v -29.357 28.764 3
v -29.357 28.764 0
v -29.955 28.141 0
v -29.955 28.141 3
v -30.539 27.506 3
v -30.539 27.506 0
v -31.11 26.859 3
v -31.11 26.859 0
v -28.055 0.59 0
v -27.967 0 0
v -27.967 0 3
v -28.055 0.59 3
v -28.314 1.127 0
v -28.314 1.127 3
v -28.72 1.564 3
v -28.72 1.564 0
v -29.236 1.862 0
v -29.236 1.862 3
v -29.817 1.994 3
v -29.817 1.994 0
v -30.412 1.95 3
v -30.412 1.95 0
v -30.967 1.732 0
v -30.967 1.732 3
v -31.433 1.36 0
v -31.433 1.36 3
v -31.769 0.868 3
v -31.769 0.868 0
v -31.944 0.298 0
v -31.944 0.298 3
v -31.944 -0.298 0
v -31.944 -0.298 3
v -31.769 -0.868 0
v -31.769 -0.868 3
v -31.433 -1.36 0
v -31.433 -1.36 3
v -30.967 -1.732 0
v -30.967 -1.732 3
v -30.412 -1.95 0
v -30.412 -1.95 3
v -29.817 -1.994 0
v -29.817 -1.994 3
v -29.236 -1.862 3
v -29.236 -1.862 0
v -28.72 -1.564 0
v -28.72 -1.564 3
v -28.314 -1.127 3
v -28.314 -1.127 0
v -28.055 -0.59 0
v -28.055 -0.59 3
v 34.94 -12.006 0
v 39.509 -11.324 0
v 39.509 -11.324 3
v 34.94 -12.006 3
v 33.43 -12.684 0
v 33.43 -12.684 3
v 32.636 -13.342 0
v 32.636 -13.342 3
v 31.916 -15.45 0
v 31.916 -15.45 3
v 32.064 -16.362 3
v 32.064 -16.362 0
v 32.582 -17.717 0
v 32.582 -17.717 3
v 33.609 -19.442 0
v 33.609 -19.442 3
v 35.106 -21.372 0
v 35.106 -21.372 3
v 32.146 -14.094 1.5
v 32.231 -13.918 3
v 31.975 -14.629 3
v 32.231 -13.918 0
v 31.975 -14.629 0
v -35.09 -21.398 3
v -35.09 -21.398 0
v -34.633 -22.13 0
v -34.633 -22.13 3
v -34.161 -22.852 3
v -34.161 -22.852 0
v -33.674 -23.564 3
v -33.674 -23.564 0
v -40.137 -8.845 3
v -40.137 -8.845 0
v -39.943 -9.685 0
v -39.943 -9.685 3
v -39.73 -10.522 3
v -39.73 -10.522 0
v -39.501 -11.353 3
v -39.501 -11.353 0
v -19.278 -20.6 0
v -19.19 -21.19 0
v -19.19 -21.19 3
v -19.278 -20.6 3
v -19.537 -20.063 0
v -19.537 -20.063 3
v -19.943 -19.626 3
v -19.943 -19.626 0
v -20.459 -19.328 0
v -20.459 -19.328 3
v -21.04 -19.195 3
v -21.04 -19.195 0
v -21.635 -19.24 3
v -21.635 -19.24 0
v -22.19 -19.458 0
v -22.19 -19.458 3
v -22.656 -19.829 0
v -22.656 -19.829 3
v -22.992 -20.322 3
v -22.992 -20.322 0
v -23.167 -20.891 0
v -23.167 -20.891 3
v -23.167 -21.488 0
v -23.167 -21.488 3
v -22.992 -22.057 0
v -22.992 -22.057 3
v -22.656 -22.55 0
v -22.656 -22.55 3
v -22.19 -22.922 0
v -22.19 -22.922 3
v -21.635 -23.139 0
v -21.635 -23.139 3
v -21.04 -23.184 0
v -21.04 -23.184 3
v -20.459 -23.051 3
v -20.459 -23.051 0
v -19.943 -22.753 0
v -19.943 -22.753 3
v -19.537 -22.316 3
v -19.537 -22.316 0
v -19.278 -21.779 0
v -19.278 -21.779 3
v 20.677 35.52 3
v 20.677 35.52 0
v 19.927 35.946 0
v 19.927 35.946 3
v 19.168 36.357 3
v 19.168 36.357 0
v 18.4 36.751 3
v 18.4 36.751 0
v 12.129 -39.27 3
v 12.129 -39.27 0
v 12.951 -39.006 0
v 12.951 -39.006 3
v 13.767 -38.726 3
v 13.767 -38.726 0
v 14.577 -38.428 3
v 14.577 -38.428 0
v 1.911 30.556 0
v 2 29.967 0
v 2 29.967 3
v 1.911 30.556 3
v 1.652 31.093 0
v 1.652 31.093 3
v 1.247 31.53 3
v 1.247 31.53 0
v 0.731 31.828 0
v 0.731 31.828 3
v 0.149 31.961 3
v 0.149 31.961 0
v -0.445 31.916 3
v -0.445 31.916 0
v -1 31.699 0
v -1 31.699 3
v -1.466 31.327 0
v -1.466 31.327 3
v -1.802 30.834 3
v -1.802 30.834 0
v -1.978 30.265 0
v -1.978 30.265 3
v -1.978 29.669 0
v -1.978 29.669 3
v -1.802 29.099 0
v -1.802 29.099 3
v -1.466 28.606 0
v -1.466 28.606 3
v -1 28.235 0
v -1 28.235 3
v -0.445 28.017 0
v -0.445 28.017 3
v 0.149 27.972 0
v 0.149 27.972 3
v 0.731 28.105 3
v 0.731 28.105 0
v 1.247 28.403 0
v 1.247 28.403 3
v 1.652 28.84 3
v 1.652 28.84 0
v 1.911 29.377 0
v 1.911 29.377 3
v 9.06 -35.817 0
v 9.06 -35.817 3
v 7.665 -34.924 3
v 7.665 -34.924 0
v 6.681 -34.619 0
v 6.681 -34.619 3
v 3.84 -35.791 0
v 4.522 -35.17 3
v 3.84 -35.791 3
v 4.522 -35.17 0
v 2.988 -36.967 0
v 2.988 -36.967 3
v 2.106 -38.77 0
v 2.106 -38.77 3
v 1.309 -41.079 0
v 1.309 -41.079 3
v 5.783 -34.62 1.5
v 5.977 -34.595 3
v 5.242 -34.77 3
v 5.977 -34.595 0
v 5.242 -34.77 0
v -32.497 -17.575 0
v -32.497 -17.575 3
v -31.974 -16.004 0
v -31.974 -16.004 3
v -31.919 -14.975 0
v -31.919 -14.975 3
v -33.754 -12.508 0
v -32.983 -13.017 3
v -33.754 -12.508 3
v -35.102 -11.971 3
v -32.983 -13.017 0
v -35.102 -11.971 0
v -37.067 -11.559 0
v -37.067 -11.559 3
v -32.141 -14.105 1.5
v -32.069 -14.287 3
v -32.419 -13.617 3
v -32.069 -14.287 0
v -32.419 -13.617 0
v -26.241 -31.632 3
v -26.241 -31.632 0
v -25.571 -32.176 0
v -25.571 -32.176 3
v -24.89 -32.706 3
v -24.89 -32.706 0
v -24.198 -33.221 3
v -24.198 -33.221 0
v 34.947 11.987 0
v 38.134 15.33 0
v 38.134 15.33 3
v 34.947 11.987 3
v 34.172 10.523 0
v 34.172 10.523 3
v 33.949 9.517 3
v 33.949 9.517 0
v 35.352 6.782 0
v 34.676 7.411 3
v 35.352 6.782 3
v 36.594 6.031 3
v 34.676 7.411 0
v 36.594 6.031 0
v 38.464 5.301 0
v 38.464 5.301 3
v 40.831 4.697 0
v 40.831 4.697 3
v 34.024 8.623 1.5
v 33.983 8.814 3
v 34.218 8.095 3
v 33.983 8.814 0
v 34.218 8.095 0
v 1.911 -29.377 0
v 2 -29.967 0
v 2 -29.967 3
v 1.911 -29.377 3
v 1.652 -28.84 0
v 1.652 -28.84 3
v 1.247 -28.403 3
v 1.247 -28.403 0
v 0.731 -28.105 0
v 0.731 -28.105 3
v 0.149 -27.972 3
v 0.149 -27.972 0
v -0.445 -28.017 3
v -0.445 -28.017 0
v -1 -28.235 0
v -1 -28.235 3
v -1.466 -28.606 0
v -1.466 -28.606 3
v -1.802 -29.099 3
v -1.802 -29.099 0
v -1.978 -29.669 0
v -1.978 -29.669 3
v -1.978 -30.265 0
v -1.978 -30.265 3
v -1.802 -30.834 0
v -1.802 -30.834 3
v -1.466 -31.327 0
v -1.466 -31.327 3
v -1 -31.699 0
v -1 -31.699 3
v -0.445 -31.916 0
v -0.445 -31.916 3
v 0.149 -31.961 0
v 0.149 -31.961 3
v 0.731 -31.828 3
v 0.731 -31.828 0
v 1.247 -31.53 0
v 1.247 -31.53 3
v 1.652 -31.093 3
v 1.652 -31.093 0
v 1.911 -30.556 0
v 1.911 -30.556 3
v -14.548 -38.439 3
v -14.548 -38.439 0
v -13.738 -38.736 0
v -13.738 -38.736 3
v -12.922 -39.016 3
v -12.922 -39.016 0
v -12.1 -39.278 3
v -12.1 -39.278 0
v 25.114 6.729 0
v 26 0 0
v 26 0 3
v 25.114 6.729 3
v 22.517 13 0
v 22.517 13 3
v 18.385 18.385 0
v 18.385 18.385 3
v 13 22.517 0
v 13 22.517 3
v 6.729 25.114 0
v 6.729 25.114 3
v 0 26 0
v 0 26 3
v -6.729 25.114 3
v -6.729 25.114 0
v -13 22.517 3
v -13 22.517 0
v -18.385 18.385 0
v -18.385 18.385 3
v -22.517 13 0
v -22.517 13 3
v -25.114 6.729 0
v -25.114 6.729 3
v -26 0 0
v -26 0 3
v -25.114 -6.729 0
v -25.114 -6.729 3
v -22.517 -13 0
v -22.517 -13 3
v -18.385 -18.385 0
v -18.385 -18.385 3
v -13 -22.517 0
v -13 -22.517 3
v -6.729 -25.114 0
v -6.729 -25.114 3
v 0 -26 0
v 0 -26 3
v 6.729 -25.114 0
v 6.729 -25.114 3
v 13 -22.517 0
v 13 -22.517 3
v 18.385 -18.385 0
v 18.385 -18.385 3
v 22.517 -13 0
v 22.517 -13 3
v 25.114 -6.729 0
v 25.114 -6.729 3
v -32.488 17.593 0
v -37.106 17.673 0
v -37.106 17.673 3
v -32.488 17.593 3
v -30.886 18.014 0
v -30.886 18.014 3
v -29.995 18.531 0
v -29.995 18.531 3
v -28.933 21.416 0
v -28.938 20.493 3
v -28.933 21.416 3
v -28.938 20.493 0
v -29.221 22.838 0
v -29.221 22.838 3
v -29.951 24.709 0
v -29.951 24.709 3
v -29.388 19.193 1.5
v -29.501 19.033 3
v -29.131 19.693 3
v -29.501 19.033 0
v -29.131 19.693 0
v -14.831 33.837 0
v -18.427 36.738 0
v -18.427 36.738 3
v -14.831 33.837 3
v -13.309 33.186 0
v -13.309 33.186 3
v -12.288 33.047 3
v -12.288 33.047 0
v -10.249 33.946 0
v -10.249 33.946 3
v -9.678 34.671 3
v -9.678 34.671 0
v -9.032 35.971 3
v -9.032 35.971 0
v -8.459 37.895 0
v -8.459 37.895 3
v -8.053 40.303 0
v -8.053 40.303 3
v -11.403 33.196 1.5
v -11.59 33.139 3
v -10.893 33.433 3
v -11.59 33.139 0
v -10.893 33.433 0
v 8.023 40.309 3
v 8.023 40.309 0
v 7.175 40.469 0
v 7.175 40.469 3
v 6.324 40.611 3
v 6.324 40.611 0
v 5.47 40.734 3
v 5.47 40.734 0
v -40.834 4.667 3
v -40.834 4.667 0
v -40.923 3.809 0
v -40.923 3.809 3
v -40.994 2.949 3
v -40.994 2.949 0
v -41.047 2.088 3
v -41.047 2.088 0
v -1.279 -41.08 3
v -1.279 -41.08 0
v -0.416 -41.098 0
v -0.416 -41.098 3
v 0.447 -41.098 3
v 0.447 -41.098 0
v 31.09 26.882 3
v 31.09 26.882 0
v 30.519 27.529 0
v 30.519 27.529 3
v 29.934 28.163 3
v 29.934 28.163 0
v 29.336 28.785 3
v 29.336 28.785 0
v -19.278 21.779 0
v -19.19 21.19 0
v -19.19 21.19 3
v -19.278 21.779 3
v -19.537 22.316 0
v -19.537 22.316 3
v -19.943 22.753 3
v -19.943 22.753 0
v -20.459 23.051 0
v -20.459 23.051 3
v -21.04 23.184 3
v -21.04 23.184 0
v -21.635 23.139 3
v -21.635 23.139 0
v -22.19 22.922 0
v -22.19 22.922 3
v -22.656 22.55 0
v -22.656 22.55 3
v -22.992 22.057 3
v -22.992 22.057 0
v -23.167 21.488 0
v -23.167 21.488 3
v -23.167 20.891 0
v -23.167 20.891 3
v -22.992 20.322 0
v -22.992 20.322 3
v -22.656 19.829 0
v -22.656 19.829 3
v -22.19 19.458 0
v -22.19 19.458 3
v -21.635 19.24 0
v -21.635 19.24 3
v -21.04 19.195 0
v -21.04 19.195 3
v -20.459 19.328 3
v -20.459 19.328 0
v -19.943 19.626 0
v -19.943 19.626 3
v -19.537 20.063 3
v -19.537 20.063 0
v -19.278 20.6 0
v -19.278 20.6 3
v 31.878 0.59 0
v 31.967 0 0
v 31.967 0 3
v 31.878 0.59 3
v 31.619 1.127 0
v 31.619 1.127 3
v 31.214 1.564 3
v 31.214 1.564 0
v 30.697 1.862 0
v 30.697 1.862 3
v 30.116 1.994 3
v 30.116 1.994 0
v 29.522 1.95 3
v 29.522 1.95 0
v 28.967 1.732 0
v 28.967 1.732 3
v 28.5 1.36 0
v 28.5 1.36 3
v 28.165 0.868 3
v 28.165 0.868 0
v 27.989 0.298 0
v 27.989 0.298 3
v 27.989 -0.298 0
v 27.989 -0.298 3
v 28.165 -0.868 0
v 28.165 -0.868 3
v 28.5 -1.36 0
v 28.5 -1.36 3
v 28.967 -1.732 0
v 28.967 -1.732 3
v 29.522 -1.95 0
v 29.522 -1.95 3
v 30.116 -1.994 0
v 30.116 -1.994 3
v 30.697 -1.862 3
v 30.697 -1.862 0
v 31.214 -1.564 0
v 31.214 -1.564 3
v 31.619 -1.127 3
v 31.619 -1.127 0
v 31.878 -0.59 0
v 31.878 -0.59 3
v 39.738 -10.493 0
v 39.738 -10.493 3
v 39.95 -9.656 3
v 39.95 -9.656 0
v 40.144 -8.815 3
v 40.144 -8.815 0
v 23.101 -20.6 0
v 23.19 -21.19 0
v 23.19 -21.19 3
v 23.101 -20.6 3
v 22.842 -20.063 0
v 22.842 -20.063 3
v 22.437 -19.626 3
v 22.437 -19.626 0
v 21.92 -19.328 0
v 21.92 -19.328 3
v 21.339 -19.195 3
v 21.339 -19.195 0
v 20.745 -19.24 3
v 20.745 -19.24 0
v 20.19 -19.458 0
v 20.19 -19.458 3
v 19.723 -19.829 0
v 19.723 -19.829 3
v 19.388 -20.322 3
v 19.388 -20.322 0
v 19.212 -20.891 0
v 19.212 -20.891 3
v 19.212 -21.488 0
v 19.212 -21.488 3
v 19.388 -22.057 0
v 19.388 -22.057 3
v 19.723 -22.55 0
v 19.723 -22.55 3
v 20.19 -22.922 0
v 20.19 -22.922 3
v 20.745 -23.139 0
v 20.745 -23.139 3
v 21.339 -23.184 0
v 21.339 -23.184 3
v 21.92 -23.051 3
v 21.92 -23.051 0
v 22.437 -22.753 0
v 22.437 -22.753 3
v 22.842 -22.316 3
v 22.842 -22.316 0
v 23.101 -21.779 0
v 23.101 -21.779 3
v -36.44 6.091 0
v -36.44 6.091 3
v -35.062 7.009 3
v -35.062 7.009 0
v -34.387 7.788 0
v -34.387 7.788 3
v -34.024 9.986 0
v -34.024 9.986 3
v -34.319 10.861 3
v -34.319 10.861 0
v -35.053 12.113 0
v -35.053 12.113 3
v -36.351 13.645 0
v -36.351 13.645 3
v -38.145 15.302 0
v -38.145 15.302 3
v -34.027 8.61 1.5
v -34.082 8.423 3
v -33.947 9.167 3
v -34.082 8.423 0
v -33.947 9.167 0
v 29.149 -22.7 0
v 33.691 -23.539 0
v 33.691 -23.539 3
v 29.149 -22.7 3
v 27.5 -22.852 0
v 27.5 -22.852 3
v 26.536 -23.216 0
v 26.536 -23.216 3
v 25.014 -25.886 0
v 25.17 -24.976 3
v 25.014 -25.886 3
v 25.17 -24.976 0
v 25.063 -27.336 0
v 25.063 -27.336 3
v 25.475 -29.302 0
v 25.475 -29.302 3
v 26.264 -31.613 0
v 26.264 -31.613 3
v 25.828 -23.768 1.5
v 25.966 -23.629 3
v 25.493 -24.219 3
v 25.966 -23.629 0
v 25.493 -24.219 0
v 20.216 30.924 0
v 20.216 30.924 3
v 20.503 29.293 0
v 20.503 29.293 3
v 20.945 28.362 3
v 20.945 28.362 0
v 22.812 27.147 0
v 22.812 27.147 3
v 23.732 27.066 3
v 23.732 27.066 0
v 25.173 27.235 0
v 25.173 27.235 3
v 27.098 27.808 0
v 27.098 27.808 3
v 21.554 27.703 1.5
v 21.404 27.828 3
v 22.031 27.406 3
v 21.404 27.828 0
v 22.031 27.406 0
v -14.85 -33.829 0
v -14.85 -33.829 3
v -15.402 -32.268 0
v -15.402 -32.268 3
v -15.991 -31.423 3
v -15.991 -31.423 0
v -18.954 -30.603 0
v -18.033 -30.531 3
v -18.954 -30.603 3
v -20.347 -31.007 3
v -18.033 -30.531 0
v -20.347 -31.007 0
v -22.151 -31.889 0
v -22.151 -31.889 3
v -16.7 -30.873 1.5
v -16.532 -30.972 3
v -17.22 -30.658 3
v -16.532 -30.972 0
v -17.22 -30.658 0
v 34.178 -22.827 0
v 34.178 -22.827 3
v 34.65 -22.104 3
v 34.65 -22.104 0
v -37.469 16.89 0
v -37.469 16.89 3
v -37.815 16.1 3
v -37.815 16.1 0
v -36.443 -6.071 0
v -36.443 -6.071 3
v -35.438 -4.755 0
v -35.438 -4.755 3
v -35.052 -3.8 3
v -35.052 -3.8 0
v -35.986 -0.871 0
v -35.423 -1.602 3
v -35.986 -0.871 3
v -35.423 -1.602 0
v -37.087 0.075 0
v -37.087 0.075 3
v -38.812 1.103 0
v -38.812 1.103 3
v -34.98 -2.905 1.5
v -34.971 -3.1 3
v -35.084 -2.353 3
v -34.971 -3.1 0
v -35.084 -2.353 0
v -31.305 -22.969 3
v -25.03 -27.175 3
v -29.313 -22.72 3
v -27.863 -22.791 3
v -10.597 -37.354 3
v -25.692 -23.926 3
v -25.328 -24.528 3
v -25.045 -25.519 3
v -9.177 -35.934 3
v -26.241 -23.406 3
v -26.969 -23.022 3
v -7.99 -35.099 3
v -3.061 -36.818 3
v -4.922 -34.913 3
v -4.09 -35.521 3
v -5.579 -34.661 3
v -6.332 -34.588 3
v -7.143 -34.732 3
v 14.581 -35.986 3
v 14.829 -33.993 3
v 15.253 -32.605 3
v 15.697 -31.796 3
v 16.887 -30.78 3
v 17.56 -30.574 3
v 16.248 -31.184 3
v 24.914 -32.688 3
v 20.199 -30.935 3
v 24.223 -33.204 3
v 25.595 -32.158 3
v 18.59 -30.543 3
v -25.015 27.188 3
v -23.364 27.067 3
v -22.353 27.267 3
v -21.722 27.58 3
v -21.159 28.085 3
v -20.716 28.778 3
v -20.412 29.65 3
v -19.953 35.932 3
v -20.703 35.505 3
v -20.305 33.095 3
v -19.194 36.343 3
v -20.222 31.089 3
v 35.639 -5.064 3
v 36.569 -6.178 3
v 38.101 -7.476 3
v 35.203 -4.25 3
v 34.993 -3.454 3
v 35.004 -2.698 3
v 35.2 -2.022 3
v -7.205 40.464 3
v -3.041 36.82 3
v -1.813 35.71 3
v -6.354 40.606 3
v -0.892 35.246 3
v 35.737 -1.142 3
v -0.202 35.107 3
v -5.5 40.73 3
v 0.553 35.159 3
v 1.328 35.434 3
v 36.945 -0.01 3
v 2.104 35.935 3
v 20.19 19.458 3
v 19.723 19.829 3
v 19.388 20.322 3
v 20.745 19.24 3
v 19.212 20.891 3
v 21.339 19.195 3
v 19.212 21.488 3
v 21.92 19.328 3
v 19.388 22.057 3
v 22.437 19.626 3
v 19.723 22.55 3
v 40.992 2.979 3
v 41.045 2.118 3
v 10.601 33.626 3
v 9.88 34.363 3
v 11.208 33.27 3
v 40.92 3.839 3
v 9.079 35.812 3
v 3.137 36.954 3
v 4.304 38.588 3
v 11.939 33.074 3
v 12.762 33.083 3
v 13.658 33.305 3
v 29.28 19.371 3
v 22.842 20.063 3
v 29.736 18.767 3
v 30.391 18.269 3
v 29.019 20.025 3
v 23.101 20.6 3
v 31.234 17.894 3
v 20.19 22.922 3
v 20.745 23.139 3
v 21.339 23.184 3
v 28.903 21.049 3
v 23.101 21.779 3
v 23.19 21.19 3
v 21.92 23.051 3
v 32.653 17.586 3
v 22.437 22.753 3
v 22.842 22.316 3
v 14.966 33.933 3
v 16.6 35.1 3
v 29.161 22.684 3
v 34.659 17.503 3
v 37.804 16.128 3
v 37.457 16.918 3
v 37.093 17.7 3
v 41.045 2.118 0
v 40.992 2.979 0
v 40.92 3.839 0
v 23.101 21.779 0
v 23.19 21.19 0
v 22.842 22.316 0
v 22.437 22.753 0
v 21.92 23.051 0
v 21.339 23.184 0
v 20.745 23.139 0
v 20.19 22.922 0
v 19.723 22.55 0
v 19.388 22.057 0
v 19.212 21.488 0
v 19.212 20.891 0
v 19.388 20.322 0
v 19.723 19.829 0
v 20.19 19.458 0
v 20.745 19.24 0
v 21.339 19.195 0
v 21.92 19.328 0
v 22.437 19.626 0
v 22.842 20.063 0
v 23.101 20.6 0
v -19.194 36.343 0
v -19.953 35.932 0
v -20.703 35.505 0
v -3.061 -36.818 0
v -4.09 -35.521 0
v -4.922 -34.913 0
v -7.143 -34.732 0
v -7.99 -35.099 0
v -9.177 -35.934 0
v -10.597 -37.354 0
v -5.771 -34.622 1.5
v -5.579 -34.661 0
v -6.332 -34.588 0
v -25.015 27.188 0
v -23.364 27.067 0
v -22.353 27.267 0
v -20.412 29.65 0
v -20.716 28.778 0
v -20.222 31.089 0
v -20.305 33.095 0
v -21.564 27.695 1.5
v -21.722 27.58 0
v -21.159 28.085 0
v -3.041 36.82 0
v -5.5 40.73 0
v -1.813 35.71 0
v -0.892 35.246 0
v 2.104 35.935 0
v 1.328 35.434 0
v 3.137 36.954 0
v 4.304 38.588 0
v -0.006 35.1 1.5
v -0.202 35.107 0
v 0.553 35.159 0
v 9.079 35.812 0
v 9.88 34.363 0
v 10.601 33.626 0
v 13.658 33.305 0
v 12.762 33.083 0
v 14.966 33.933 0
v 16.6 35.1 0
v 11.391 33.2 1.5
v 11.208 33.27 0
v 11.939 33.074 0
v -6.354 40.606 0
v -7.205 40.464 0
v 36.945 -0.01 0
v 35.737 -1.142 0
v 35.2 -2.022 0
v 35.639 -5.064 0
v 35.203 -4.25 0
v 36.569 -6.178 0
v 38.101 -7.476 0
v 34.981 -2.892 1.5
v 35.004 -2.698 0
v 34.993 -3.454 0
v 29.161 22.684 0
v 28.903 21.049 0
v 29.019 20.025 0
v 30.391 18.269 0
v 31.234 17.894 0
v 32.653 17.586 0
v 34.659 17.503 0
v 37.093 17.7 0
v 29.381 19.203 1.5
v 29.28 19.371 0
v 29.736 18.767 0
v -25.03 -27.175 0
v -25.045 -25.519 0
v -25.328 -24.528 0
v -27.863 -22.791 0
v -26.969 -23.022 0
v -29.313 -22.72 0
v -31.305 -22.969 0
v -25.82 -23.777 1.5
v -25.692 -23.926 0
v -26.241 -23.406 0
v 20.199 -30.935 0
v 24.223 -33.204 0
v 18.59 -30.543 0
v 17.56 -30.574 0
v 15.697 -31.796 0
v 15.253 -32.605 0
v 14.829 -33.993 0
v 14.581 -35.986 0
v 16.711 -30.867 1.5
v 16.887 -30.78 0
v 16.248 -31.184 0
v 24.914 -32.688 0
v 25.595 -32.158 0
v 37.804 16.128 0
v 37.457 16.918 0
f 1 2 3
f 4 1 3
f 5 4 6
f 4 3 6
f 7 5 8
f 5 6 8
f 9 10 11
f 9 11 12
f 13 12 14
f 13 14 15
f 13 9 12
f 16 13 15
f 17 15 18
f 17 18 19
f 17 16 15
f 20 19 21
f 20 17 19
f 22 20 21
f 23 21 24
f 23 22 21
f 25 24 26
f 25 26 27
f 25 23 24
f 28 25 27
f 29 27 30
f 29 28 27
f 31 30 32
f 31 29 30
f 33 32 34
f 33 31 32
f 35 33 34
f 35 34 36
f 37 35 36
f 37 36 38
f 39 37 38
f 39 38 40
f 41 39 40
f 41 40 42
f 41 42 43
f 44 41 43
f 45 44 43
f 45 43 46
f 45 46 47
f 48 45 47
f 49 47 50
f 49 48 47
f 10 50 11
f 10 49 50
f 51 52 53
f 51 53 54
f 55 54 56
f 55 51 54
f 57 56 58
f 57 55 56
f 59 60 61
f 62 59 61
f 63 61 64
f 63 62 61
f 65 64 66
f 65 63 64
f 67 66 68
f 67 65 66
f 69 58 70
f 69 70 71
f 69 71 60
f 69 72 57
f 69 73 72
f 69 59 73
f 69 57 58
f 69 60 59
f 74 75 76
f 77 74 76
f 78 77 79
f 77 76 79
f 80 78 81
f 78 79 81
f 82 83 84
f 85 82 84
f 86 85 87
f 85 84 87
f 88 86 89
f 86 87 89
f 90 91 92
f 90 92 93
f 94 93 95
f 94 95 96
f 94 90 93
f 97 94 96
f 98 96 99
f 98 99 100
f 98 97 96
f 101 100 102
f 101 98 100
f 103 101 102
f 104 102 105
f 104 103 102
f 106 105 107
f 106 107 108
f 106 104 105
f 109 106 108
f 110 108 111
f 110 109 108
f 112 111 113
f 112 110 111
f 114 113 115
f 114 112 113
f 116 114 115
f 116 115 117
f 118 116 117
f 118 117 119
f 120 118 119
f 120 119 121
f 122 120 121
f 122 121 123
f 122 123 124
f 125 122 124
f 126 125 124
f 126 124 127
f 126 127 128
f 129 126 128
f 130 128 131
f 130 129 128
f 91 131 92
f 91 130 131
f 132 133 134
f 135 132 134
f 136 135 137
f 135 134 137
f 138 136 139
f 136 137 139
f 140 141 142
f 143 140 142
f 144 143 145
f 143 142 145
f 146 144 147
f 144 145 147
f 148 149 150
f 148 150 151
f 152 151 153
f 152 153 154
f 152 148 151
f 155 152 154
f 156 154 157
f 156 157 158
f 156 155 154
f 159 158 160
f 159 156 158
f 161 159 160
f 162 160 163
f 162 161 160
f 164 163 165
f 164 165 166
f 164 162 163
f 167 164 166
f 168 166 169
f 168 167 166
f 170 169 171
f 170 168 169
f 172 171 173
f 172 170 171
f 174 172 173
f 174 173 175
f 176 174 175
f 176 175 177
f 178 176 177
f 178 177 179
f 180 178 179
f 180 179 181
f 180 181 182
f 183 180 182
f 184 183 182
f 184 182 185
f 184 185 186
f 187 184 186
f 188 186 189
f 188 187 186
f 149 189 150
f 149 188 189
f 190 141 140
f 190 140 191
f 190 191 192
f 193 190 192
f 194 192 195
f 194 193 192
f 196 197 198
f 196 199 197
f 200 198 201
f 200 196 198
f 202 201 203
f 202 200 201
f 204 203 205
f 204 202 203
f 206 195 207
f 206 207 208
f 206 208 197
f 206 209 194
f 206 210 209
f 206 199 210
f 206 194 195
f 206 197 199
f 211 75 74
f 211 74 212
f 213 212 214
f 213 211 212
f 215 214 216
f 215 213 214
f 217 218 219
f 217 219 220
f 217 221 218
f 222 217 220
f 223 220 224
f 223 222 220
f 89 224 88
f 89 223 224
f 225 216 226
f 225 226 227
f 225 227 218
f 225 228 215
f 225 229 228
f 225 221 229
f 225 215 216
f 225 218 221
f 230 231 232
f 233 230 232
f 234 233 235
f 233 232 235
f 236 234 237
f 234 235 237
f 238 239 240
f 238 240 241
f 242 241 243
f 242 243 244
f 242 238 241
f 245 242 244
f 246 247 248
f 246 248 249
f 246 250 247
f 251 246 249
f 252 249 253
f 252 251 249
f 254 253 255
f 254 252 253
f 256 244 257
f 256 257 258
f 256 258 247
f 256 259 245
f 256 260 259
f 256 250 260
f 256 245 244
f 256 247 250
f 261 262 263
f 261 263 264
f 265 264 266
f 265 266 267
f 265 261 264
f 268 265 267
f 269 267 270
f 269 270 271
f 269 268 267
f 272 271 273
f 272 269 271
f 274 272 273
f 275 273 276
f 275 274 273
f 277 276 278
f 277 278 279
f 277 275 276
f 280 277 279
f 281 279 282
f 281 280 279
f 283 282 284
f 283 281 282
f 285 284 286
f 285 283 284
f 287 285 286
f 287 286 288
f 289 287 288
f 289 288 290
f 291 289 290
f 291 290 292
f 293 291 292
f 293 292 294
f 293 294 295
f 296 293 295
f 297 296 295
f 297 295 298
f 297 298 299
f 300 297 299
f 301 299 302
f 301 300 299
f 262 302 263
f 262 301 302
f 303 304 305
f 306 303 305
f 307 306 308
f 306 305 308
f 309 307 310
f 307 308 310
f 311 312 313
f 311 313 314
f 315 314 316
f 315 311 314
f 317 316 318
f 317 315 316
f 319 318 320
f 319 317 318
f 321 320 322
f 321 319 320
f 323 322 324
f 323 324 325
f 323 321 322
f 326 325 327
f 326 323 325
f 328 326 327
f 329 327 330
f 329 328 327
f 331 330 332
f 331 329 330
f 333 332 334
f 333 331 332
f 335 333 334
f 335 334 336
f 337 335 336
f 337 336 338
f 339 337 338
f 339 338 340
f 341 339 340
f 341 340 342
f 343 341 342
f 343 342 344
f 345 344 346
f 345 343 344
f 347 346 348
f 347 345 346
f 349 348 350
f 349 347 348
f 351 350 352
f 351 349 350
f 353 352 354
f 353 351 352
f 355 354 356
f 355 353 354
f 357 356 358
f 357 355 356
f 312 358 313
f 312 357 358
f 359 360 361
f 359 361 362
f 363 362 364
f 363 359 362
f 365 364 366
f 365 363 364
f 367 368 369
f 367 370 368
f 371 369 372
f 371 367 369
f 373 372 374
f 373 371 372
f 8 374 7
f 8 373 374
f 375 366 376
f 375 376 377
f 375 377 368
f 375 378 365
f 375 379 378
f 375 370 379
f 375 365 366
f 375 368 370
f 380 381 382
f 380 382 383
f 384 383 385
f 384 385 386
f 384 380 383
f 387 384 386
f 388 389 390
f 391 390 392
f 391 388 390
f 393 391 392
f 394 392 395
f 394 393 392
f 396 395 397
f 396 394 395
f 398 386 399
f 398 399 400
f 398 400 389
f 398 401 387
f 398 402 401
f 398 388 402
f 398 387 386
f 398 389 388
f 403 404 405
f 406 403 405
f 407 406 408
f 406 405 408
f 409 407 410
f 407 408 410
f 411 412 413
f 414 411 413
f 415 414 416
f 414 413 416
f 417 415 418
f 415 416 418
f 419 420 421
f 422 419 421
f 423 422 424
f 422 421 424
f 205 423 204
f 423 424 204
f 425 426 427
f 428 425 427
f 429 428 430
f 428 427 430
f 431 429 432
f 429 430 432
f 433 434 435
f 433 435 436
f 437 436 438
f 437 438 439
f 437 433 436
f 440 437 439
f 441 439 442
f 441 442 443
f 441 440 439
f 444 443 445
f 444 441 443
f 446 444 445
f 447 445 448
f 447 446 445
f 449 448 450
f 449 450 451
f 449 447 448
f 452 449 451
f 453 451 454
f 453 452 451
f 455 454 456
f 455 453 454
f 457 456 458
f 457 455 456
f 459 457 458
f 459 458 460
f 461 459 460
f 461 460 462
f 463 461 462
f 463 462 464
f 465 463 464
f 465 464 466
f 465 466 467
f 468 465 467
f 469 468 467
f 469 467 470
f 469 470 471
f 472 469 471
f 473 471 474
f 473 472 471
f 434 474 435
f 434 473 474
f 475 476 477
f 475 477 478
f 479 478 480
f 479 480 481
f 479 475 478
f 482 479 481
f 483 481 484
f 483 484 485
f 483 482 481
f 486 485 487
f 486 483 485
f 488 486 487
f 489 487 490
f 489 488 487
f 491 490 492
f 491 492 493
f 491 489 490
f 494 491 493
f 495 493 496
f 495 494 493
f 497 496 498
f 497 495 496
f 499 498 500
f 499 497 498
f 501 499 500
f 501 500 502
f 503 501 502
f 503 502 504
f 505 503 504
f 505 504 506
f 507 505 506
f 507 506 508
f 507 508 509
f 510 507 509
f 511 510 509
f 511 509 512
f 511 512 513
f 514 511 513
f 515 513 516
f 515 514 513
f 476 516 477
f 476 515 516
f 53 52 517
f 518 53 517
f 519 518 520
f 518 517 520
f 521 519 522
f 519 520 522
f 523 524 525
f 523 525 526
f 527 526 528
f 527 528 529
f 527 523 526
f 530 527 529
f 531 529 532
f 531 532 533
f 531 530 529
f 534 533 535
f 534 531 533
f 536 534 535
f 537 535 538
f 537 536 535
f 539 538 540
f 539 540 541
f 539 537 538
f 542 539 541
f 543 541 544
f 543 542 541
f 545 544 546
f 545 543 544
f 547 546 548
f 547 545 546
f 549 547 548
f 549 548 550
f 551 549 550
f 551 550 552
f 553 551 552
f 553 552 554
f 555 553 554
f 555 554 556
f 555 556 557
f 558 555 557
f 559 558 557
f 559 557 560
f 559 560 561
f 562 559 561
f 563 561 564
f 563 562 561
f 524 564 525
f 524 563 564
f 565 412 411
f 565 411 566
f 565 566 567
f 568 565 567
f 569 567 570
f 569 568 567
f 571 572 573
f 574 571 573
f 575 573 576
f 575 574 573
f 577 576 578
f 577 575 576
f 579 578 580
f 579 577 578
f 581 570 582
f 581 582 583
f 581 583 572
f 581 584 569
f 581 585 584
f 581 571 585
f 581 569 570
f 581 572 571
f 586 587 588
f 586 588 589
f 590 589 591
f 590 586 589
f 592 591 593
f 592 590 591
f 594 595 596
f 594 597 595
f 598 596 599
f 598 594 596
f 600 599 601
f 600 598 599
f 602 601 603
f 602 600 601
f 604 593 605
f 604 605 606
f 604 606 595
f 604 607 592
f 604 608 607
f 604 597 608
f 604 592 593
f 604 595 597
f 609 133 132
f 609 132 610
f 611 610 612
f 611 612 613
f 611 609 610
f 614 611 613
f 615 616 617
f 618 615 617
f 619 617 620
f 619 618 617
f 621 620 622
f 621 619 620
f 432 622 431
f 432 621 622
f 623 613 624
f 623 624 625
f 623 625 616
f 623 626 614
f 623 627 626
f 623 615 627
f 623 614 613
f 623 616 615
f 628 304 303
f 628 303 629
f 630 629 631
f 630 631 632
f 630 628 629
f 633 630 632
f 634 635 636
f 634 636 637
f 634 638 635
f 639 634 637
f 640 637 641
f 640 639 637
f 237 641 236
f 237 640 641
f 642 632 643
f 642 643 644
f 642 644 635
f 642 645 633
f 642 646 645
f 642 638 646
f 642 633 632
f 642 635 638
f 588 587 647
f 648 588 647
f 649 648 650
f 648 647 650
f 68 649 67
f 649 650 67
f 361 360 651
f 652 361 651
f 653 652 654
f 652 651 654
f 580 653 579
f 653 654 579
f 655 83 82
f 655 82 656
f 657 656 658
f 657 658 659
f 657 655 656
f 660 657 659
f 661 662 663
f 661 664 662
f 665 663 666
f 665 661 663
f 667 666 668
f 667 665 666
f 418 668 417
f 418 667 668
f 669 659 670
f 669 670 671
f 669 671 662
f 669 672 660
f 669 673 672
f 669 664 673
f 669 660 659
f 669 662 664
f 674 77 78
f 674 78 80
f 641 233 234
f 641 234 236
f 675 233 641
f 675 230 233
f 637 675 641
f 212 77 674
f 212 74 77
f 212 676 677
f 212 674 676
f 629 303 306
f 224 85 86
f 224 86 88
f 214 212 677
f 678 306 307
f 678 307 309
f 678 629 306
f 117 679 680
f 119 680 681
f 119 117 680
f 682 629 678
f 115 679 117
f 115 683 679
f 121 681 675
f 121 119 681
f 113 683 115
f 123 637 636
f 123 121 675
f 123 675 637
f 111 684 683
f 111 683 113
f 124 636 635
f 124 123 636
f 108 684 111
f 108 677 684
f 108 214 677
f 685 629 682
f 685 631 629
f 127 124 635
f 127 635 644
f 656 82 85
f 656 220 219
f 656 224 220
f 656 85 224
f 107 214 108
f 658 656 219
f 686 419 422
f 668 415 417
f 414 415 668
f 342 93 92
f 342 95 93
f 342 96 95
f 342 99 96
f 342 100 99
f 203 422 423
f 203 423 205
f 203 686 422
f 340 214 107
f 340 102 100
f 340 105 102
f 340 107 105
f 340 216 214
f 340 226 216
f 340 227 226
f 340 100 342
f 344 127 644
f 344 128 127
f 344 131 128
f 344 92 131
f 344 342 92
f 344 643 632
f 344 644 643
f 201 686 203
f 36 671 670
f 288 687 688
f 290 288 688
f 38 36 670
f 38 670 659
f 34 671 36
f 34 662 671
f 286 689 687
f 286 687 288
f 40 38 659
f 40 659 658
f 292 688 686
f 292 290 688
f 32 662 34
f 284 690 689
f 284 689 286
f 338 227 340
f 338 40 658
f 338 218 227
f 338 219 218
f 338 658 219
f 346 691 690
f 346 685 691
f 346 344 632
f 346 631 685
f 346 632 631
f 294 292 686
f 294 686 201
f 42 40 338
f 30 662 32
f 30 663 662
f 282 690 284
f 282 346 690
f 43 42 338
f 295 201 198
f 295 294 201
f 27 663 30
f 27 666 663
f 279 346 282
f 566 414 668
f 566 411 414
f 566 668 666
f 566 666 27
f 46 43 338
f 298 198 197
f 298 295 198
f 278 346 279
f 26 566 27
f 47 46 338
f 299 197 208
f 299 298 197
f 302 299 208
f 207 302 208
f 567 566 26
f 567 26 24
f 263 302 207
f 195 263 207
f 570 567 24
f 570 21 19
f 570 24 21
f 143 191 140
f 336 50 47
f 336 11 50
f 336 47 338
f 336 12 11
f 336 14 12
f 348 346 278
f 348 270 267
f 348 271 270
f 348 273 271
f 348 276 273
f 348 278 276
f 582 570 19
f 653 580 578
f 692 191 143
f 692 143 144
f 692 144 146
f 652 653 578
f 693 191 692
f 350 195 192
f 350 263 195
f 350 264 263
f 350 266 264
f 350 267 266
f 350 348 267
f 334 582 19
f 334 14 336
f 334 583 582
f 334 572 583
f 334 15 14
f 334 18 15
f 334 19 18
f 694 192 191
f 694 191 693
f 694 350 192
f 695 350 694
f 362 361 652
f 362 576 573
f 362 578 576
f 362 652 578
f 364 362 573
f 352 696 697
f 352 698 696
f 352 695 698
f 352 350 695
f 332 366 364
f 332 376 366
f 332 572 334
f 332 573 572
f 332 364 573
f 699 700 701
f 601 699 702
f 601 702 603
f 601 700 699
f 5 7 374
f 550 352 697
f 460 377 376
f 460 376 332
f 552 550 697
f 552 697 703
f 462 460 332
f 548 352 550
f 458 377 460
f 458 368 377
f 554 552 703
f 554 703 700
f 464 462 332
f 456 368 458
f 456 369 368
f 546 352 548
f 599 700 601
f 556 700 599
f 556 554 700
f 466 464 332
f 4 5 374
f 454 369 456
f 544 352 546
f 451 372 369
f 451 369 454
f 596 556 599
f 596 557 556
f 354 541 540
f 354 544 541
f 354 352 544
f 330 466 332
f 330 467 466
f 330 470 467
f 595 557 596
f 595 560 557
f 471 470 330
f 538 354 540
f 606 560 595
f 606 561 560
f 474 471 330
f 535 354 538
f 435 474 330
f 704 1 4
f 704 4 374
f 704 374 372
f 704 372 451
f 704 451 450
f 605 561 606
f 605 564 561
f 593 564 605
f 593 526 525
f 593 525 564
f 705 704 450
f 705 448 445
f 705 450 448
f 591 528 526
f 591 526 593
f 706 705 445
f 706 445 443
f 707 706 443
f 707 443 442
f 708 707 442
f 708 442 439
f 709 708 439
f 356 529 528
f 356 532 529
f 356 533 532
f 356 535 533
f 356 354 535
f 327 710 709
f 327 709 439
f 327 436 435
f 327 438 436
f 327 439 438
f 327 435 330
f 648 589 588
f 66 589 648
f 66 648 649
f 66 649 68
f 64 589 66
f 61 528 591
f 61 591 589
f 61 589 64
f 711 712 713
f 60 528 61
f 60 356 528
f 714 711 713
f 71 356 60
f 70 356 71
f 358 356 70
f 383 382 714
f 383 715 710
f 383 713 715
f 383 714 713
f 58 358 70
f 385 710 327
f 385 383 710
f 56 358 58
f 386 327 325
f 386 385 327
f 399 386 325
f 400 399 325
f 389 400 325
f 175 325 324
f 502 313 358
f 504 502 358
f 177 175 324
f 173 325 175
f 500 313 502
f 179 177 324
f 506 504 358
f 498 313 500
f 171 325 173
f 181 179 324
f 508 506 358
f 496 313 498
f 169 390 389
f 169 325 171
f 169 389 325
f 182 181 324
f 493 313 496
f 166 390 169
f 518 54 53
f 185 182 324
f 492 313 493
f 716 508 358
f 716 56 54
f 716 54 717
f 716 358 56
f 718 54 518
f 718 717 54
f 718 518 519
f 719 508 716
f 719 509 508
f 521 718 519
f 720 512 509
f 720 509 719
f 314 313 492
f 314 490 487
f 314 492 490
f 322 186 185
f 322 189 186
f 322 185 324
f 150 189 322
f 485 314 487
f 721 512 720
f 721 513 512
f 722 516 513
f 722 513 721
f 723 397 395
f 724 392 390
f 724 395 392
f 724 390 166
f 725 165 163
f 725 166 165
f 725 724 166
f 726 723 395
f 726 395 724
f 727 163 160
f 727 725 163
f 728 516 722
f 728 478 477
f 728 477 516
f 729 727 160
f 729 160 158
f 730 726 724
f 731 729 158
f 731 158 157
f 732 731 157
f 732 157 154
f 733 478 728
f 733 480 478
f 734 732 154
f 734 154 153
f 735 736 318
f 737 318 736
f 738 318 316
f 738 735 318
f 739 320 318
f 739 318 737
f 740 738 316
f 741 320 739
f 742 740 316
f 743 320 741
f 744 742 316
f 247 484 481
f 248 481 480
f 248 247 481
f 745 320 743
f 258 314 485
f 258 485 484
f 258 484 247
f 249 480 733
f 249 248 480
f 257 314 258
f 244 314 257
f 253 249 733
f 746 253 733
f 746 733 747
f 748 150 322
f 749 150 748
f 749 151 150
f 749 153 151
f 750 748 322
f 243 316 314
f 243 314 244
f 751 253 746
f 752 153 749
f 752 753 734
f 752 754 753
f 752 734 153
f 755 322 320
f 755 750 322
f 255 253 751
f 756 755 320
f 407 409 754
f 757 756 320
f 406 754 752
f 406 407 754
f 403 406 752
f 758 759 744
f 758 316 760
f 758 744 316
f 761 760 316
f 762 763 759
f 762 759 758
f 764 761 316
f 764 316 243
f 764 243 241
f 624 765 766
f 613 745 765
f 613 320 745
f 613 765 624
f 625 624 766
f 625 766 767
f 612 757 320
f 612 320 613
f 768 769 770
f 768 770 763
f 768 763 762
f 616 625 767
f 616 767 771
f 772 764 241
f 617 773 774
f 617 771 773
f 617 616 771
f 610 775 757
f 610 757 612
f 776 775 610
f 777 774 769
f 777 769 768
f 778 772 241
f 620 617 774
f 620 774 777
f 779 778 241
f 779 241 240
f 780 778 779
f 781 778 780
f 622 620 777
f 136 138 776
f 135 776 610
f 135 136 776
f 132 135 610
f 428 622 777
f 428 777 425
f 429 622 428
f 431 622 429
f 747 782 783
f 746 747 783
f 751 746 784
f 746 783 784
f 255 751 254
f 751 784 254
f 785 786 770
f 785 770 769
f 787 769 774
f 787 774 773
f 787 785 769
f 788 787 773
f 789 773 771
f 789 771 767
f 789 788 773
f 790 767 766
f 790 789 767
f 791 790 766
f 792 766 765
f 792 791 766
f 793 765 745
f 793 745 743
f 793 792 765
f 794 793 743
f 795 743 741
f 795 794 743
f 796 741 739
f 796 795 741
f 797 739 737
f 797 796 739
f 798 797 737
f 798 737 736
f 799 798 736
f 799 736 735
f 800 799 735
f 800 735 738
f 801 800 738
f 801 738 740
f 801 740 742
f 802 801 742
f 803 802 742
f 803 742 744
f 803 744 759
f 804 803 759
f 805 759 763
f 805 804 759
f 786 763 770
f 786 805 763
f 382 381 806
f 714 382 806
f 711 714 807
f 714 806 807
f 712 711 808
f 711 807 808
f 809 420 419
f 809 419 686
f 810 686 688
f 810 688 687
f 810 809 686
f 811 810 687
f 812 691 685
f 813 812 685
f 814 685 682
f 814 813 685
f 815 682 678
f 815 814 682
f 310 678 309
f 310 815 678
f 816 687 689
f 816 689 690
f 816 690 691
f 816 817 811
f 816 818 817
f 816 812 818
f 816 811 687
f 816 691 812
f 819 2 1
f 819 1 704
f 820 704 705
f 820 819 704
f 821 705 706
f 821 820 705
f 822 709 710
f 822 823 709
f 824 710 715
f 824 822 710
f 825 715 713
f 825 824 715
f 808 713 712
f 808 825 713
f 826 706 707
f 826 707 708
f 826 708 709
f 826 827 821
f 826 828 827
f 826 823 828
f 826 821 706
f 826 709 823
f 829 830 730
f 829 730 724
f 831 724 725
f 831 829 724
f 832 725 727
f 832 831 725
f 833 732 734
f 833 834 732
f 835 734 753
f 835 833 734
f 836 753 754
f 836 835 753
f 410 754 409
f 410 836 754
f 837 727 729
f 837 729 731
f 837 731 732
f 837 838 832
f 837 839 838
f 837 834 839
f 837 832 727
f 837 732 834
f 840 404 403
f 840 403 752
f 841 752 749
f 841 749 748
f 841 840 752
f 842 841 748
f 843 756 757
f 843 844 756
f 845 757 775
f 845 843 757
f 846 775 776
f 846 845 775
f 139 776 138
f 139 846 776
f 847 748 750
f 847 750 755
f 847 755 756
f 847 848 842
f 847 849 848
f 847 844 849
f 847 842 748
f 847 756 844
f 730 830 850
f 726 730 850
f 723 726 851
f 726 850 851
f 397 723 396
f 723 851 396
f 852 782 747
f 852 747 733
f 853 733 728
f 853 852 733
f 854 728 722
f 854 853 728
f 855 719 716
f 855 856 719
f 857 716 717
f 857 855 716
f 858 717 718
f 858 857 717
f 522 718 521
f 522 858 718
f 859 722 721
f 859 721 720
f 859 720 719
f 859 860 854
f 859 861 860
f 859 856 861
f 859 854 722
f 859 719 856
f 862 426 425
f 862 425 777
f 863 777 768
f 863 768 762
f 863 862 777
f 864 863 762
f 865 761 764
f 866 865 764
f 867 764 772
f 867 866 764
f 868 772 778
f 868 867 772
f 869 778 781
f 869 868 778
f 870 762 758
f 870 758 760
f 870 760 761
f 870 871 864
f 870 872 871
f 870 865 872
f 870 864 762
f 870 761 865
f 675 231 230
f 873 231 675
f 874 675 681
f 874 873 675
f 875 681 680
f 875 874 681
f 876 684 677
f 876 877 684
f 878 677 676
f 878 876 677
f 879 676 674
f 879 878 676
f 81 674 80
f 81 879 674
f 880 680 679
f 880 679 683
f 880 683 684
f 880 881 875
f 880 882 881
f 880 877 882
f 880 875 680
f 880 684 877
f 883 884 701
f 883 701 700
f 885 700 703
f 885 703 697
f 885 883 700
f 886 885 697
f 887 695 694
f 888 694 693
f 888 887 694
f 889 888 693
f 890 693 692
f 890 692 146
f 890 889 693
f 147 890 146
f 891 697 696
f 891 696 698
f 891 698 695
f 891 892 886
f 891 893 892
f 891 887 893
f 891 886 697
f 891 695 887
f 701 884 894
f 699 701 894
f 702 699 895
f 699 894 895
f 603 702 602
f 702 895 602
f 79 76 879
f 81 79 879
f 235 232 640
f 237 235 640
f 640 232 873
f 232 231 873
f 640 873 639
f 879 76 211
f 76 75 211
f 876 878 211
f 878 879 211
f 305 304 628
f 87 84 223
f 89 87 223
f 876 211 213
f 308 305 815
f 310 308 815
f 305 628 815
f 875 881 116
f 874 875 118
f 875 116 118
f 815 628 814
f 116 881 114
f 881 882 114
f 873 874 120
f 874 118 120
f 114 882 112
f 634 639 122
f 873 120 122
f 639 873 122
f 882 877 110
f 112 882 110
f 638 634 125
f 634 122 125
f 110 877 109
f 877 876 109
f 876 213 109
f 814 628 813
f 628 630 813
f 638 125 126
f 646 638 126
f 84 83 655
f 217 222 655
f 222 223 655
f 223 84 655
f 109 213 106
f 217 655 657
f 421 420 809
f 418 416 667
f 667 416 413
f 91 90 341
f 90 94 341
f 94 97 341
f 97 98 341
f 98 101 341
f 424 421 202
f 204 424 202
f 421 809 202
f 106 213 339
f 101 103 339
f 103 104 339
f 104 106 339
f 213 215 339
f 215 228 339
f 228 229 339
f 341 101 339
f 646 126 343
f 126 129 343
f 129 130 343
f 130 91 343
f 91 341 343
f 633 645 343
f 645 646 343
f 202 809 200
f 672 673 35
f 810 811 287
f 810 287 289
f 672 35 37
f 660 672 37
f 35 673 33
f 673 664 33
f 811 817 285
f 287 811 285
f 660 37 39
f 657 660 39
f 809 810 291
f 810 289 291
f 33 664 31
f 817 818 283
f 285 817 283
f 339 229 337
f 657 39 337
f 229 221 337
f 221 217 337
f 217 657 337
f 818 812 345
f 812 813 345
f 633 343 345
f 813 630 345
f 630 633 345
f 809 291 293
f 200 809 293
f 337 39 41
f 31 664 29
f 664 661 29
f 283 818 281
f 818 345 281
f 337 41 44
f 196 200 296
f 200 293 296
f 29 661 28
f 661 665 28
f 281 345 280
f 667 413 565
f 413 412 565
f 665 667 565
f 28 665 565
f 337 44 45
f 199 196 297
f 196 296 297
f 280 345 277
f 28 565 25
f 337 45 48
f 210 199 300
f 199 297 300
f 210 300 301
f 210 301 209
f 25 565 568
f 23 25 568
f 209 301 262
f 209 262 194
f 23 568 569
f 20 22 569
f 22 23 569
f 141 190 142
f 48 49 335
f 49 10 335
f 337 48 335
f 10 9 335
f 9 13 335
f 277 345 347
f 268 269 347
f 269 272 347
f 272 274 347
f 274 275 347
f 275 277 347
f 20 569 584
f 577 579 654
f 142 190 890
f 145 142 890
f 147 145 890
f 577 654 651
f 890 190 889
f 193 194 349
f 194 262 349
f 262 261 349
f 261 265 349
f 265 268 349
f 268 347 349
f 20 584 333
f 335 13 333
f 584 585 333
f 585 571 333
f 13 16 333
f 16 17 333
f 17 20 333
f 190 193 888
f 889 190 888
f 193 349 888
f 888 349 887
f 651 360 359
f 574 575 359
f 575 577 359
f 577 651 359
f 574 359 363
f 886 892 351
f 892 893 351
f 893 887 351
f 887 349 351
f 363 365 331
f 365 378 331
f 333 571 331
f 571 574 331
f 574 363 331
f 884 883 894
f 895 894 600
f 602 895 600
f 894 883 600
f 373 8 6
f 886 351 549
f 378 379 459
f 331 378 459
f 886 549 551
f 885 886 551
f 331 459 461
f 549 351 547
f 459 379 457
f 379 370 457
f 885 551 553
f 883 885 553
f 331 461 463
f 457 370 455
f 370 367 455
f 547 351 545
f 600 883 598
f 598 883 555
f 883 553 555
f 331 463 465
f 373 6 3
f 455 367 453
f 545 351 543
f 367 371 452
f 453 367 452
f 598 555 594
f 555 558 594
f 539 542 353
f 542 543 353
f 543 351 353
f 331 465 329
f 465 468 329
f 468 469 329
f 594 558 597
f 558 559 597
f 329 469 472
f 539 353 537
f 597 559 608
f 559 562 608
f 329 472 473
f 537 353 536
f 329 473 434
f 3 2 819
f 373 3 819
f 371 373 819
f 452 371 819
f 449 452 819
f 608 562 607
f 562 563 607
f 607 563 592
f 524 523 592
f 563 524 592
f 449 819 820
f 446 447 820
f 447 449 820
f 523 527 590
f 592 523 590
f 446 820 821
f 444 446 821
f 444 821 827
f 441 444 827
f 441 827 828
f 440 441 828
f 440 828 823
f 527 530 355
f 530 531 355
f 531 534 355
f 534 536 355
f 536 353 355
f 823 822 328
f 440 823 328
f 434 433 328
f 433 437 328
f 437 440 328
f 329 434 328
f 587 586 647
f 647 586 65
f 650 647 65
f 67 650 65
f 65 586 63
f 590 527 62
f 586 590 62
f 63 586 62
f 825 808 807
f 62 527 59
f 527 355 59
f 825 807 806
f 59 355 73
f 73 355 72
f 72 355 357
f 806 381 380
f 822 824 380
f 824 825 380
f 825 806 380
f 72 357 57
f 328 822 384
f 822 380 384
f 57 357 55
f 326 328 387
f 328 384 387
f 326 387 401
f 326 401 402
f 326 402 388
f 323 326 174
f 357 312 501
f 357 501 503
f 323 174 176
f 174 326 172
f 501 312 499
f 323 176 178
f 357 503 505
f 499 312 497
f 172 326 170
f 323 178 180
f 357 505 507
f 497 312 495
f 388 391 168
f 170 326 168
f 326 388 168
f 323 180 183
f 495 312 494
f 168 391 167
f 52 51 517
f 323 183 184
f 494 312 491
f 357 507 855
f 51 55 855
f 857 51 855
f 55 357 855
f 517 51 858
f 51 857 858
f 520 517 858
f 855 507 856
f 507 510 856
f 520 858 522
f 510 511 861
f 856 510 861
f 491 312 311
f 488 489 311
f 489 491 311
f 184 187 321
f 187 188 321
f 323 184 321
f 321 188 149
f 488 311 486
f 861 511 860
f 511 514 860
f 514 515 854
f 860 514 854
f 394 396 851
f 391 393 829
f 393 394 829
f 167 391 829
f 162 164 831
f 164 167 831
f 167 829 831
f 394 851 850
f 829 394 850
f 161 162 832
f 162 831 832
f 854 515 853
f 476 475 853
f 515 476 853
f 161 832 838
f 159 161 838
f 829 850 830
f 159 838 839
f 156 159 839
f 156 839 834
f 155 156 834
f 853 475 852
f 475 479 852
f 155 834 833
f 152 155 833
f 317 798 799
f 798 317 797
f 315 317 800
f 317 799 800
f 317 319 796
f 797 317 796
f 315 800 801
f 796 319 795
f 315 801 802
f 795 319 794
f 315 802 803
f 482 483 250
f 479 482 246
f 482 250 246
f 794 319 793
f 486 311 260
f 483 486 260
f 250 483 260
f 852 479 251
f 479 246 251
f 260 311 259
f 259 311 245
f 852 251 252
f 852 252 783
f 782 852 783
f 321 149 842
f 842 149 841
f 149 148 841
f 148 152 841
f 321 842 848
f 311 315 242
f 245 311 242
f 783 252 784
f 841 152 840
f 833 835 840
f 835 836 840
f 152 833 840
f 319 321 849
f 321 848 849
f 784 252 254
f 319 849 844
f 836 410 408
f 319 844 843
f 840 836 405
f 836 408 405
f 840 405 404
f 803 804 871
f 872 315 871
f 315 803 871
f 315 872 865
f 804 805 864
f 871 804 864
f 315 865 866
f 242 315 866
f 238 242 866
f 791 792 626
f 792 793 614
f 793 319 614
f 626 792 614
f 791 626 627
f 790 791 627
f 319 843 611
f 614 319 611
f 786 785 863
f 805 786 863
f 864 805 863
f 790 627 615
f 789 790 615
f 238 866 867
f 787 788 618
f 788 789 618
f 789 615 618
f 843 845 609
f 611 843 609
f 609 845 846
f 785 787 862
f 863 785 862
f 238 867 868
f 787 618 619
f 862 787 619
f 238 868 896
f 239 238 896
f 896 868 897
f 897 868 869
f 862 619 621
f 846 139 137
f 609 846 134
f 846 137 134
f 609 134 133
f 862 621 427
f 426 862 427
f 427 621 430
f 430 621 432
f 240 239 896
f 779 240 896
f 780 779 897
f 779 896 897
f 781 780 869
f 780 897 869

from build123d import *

# Parameters (mm, degrees)
SKETCH_1_R      = 26
SKETCH_1_R_2    = 2
EXTRUDE_1_DEPTH = 3


with BuildPart() as part:
    # Эскиз1 → Вытянуть1 (new body)
    with BuildSketch(Plane.XY):
        with BuildLine():
            ThreePointArc((-5.5, 40.730332677), (-6.779718382, 40.536963609), (-8.052713795, 40.303396886))
            add(Edge.make_bspline(
                [(-18.42711223, 36.737603826), (-9.565846889, 27.871779004), (-8.052713795, 40.303396886)],
                knots=[0, 0, 0, 1, 1, 1], degree=2))
            ThreePointArc((-18.42711223, 36.737603826), (-19.574705107, 36.139188148), (-20.702887125, 35.504935779))
            add(Edge.make_bspline(
                [(-29.357360924, 28.763785557), (-18.097494767, 23.255583732), (-20.702887125, 35.504935779)],
                knots=[0, 0, 0, 1, 1, 1], degree=2))
            ThreePointArc((-29.357360924, 28.763785557), (-30.2484688, 27.825170893), (-31.109581398, 26.858963965))
            add(Edge.make_bspline(
                [(-37.106284036, 17.672964807), (-24.667998276, 16.119285114), (-31.109581398, 26.858963965)],
                knots=[0, 0, 0, 1, 1, 1], degree=2))
            ThreePointArc((-37.106284036, 17.672964807), (-37.644341546, 16.49586462), (-38.145069811, 15.302406645))
            add(Edge.make_bspline(
                [(-40.834165508, 4.667004096), (-28.565341408, 7.236211838), (-38.145069811, 15.302406645)],
                knots=[0, 0, 0, 1, 1, 1], degree=2))
            ThreePointArc((-40.834165508, 4.667004096), (-40.960865773, 3.378975456), (-41.046948028, 2.087596124))
            add(Edge.make_bspline(
                [(-40.137031541, -8.844698925), (-29.367186562, -2.431017271), (-41.046948028, 2.087596124)],
                knots=[0, 0, 0, 1, 1, 1], degree=2))
            ThreePointArc((-40.137031541, -8.844698925), (-39.83864462, -10.104078129), (-39.500752518, -11.353437829))
            add(Edge.make_bspline(
                [(-35.090427416, -21.397941578), (-26.986641373, -11.834807939), (-39.500752518, -11.353437829)],
                knots=[0, 0, 0, 1, 1, 1], degree=2))
            ThreePointArc((-35.090427416, -21.397941578), (-34.399288162, -22.492198068), (-33.674037554, -23.564150627))
            add(Edge.make_bspline(
                [(-26.241230996, -31.632385237), (-21.68167485, -19.95611353), (-33.674037554, -23.564150627)],
                knots=[0, 0, 0, 1, 1, 1], degree=2))
            ThreePointArc((-26.241230996, -31.632385237), (-25.232235072, -32.442939344), (-24.198218116, -33.221322069))
            add(Edge.make_bspline(
                [(-14.548390024, -38.438969129), (-14.027162432, -25.91486457), (-24.198218116, -33.221322069)],
                knots=[0, 0, 0, 1, 1, 1], degree=2))
            ThreePointArc((-14.548390024, -38.438969129), (-13.330877794, -38.877984737), (-12.10014627, -39.278447783))
            add(Edge.make_bspline(
                [(-1.27900525, -41.080094274), (-4.85258931, -29.065337922), (-12.10014627, -39.278447783)],
                knots=[0, 0, 0, 1, 1, 1], degree=2))
            ThreePointArc((-1.27900525, -41.080094274), (0.015086944, -41.099997231), (1.309164177, -41.079144212))
            add(Edge.make_bspline(
                [(12.128979588, -39.269553781), (4.84783716, -29.066130916), (1.309164177, -41.079144212)],
                knots=[0, 0, 0, 1, 1, 1], degree=2))
            ThreePointArc((12.128979588, -39.269553781), (13.359416777, -38.868187292), (14.576606372, -38.428277956))
            add(Edge.make_bspline(
                [(24.222601287, -33.203547806), (14.022925251, -25.917157617), (14.576606372, -38.428277956)],
                knots=[0, 0, 0, 1, 1, 1], degree=2))
            ThreePointArc((24.222601287, -33.203547806), (25.256046509, -32.424406158), (26.264447087, -31.613111508))
            add(Edge.make_bspline(
                [(33.691328284, -23.53942222), (21.678411803, -19.959658145), (26.264447087, -31.613111508)],
                knots=[0, 0, 0, 1, 1, 1], degree=2))
            ThreePointArc((33.691328284, -23.53942222), (34.415791714, -22.466937501), (35.106127425, -21.3721739))
            add(Edge.make_bspline(
                [(39.509077087, -11.324434984), (26.984706061, -11.839220006), (35.106127425, -21.3721739)],
                knots=[0, 0, 0, 1, 1, 1], degree=2))
            ThreePointArc((39.509077087, -11.324434984), (39.846051872, -10.074827555), (40.143514129, -8.815229627))
            add(Edge.make_bspline(
                [(41.045404341, 2.117730498), (29.366788706, -2.435818675), (40.143514129, -8.815229627)],
                knots=[0, 0, 0, 1, 1, 1], degree=2))
            ThreePointArc((41.045404341, 2.117730498), (40.958374033, 3.409046284), (40.830728186, 4.696981559))
            add(Edge.make_bspline(
                [(38.13382515, 15.330407021), (28.566524123, 7.231541404), (40.830728186, 4.696981559)],
                knots=[0, 0, 0, 1, 1, 1], degree=2))
            ThreePointArc((38.13382515, 15.330407021), (37.632220833, 16.523497062), (37.093299291, 17.700201912))
            add(Edge.make_bspline(
                [(31.089854296, 26.881796068), (24.670633395, 16.115251764), (37.093299291, 17.700201912)],
                knots=[0, 0, 0, 1, 1, 1], degree=2))
            ThreePointArc((31.089854296, 26.881796068), (30.228032583, 27.847370544), (29.336235855, 28.785330741))
            add(Edge.make_bspline(
                [(20.676815321, 35.520125397), (18.101296735, 23.252624541), (29.336235855, 28.785330741)],
                knots=[0, 0, 0, 1, 1, 1], degree=2))
            ThreePointArc((20.676815321, 35.520125397), (19.548167965, 36.153549331), (18.400136066, 36.751122333))
            add(Edge.make_bspline(
                [(8.023122571, 40.309297987), (9.570403703, 27.870214648), (18.400136066, 36.751122333)],
                knots=[0, 0, 0, 1, 1, 1], degree=2))
            ThreePointArc((8.023122571, 40.309297987), (6.749956027, 40.541930068), (5.470096027, 40.734359569))
            add(Edge.make_bspline(
                [(-5.5, 40.730332677), (0.00240893, 29.467634546), (5.470096027, 40.734359569)],
                knots=[0, 0, 0, 1, 1, 1], degree=2))
        make_face()
        Circle(SKETCH_1_R, mode=Mode.SUBTRACT)
        with Locations((0, 29.966593386)):
            Circle(SKETCH_1_R_2, mode=Mode.SUBTRACT)
        with Locations((21.189581392, 21.189581392)):
            Circle(SKETCH_1_R_2, mode=Mode.SUBTRACT)
        with Locations((29.966593386, 0)):
            Circle(SKETCH_1_R_2, mode=Mode.SUBTRACT)
        with Locations((21.189581392, -21.189581392)):
            Circle(SKETCH_1_R_2, mode=Mode.SUBTRACT)
        with Locations((0, -29.966593386)):
            Circle(SKETCH_1_R_2, mode=Mode.SUBTRACT)
        with Locations((-21.189581392, -21.189581392)):
            Circle(SKETCH_1_R_2, mode=Mode.SUBTRACT)
        with Locations((-29.966593386, 0)):
            Circle(SKETCH_1_R_2, mode=Mode.SUBTRACT)
        with Locations((-21.189581392, 21.189581392)):
            Circle(SKETCH_1_R_2, mode=Mode.SUBTRACT)
    extrude(amount=EXTRUDE_1_DEPTH)


solid = part.part
